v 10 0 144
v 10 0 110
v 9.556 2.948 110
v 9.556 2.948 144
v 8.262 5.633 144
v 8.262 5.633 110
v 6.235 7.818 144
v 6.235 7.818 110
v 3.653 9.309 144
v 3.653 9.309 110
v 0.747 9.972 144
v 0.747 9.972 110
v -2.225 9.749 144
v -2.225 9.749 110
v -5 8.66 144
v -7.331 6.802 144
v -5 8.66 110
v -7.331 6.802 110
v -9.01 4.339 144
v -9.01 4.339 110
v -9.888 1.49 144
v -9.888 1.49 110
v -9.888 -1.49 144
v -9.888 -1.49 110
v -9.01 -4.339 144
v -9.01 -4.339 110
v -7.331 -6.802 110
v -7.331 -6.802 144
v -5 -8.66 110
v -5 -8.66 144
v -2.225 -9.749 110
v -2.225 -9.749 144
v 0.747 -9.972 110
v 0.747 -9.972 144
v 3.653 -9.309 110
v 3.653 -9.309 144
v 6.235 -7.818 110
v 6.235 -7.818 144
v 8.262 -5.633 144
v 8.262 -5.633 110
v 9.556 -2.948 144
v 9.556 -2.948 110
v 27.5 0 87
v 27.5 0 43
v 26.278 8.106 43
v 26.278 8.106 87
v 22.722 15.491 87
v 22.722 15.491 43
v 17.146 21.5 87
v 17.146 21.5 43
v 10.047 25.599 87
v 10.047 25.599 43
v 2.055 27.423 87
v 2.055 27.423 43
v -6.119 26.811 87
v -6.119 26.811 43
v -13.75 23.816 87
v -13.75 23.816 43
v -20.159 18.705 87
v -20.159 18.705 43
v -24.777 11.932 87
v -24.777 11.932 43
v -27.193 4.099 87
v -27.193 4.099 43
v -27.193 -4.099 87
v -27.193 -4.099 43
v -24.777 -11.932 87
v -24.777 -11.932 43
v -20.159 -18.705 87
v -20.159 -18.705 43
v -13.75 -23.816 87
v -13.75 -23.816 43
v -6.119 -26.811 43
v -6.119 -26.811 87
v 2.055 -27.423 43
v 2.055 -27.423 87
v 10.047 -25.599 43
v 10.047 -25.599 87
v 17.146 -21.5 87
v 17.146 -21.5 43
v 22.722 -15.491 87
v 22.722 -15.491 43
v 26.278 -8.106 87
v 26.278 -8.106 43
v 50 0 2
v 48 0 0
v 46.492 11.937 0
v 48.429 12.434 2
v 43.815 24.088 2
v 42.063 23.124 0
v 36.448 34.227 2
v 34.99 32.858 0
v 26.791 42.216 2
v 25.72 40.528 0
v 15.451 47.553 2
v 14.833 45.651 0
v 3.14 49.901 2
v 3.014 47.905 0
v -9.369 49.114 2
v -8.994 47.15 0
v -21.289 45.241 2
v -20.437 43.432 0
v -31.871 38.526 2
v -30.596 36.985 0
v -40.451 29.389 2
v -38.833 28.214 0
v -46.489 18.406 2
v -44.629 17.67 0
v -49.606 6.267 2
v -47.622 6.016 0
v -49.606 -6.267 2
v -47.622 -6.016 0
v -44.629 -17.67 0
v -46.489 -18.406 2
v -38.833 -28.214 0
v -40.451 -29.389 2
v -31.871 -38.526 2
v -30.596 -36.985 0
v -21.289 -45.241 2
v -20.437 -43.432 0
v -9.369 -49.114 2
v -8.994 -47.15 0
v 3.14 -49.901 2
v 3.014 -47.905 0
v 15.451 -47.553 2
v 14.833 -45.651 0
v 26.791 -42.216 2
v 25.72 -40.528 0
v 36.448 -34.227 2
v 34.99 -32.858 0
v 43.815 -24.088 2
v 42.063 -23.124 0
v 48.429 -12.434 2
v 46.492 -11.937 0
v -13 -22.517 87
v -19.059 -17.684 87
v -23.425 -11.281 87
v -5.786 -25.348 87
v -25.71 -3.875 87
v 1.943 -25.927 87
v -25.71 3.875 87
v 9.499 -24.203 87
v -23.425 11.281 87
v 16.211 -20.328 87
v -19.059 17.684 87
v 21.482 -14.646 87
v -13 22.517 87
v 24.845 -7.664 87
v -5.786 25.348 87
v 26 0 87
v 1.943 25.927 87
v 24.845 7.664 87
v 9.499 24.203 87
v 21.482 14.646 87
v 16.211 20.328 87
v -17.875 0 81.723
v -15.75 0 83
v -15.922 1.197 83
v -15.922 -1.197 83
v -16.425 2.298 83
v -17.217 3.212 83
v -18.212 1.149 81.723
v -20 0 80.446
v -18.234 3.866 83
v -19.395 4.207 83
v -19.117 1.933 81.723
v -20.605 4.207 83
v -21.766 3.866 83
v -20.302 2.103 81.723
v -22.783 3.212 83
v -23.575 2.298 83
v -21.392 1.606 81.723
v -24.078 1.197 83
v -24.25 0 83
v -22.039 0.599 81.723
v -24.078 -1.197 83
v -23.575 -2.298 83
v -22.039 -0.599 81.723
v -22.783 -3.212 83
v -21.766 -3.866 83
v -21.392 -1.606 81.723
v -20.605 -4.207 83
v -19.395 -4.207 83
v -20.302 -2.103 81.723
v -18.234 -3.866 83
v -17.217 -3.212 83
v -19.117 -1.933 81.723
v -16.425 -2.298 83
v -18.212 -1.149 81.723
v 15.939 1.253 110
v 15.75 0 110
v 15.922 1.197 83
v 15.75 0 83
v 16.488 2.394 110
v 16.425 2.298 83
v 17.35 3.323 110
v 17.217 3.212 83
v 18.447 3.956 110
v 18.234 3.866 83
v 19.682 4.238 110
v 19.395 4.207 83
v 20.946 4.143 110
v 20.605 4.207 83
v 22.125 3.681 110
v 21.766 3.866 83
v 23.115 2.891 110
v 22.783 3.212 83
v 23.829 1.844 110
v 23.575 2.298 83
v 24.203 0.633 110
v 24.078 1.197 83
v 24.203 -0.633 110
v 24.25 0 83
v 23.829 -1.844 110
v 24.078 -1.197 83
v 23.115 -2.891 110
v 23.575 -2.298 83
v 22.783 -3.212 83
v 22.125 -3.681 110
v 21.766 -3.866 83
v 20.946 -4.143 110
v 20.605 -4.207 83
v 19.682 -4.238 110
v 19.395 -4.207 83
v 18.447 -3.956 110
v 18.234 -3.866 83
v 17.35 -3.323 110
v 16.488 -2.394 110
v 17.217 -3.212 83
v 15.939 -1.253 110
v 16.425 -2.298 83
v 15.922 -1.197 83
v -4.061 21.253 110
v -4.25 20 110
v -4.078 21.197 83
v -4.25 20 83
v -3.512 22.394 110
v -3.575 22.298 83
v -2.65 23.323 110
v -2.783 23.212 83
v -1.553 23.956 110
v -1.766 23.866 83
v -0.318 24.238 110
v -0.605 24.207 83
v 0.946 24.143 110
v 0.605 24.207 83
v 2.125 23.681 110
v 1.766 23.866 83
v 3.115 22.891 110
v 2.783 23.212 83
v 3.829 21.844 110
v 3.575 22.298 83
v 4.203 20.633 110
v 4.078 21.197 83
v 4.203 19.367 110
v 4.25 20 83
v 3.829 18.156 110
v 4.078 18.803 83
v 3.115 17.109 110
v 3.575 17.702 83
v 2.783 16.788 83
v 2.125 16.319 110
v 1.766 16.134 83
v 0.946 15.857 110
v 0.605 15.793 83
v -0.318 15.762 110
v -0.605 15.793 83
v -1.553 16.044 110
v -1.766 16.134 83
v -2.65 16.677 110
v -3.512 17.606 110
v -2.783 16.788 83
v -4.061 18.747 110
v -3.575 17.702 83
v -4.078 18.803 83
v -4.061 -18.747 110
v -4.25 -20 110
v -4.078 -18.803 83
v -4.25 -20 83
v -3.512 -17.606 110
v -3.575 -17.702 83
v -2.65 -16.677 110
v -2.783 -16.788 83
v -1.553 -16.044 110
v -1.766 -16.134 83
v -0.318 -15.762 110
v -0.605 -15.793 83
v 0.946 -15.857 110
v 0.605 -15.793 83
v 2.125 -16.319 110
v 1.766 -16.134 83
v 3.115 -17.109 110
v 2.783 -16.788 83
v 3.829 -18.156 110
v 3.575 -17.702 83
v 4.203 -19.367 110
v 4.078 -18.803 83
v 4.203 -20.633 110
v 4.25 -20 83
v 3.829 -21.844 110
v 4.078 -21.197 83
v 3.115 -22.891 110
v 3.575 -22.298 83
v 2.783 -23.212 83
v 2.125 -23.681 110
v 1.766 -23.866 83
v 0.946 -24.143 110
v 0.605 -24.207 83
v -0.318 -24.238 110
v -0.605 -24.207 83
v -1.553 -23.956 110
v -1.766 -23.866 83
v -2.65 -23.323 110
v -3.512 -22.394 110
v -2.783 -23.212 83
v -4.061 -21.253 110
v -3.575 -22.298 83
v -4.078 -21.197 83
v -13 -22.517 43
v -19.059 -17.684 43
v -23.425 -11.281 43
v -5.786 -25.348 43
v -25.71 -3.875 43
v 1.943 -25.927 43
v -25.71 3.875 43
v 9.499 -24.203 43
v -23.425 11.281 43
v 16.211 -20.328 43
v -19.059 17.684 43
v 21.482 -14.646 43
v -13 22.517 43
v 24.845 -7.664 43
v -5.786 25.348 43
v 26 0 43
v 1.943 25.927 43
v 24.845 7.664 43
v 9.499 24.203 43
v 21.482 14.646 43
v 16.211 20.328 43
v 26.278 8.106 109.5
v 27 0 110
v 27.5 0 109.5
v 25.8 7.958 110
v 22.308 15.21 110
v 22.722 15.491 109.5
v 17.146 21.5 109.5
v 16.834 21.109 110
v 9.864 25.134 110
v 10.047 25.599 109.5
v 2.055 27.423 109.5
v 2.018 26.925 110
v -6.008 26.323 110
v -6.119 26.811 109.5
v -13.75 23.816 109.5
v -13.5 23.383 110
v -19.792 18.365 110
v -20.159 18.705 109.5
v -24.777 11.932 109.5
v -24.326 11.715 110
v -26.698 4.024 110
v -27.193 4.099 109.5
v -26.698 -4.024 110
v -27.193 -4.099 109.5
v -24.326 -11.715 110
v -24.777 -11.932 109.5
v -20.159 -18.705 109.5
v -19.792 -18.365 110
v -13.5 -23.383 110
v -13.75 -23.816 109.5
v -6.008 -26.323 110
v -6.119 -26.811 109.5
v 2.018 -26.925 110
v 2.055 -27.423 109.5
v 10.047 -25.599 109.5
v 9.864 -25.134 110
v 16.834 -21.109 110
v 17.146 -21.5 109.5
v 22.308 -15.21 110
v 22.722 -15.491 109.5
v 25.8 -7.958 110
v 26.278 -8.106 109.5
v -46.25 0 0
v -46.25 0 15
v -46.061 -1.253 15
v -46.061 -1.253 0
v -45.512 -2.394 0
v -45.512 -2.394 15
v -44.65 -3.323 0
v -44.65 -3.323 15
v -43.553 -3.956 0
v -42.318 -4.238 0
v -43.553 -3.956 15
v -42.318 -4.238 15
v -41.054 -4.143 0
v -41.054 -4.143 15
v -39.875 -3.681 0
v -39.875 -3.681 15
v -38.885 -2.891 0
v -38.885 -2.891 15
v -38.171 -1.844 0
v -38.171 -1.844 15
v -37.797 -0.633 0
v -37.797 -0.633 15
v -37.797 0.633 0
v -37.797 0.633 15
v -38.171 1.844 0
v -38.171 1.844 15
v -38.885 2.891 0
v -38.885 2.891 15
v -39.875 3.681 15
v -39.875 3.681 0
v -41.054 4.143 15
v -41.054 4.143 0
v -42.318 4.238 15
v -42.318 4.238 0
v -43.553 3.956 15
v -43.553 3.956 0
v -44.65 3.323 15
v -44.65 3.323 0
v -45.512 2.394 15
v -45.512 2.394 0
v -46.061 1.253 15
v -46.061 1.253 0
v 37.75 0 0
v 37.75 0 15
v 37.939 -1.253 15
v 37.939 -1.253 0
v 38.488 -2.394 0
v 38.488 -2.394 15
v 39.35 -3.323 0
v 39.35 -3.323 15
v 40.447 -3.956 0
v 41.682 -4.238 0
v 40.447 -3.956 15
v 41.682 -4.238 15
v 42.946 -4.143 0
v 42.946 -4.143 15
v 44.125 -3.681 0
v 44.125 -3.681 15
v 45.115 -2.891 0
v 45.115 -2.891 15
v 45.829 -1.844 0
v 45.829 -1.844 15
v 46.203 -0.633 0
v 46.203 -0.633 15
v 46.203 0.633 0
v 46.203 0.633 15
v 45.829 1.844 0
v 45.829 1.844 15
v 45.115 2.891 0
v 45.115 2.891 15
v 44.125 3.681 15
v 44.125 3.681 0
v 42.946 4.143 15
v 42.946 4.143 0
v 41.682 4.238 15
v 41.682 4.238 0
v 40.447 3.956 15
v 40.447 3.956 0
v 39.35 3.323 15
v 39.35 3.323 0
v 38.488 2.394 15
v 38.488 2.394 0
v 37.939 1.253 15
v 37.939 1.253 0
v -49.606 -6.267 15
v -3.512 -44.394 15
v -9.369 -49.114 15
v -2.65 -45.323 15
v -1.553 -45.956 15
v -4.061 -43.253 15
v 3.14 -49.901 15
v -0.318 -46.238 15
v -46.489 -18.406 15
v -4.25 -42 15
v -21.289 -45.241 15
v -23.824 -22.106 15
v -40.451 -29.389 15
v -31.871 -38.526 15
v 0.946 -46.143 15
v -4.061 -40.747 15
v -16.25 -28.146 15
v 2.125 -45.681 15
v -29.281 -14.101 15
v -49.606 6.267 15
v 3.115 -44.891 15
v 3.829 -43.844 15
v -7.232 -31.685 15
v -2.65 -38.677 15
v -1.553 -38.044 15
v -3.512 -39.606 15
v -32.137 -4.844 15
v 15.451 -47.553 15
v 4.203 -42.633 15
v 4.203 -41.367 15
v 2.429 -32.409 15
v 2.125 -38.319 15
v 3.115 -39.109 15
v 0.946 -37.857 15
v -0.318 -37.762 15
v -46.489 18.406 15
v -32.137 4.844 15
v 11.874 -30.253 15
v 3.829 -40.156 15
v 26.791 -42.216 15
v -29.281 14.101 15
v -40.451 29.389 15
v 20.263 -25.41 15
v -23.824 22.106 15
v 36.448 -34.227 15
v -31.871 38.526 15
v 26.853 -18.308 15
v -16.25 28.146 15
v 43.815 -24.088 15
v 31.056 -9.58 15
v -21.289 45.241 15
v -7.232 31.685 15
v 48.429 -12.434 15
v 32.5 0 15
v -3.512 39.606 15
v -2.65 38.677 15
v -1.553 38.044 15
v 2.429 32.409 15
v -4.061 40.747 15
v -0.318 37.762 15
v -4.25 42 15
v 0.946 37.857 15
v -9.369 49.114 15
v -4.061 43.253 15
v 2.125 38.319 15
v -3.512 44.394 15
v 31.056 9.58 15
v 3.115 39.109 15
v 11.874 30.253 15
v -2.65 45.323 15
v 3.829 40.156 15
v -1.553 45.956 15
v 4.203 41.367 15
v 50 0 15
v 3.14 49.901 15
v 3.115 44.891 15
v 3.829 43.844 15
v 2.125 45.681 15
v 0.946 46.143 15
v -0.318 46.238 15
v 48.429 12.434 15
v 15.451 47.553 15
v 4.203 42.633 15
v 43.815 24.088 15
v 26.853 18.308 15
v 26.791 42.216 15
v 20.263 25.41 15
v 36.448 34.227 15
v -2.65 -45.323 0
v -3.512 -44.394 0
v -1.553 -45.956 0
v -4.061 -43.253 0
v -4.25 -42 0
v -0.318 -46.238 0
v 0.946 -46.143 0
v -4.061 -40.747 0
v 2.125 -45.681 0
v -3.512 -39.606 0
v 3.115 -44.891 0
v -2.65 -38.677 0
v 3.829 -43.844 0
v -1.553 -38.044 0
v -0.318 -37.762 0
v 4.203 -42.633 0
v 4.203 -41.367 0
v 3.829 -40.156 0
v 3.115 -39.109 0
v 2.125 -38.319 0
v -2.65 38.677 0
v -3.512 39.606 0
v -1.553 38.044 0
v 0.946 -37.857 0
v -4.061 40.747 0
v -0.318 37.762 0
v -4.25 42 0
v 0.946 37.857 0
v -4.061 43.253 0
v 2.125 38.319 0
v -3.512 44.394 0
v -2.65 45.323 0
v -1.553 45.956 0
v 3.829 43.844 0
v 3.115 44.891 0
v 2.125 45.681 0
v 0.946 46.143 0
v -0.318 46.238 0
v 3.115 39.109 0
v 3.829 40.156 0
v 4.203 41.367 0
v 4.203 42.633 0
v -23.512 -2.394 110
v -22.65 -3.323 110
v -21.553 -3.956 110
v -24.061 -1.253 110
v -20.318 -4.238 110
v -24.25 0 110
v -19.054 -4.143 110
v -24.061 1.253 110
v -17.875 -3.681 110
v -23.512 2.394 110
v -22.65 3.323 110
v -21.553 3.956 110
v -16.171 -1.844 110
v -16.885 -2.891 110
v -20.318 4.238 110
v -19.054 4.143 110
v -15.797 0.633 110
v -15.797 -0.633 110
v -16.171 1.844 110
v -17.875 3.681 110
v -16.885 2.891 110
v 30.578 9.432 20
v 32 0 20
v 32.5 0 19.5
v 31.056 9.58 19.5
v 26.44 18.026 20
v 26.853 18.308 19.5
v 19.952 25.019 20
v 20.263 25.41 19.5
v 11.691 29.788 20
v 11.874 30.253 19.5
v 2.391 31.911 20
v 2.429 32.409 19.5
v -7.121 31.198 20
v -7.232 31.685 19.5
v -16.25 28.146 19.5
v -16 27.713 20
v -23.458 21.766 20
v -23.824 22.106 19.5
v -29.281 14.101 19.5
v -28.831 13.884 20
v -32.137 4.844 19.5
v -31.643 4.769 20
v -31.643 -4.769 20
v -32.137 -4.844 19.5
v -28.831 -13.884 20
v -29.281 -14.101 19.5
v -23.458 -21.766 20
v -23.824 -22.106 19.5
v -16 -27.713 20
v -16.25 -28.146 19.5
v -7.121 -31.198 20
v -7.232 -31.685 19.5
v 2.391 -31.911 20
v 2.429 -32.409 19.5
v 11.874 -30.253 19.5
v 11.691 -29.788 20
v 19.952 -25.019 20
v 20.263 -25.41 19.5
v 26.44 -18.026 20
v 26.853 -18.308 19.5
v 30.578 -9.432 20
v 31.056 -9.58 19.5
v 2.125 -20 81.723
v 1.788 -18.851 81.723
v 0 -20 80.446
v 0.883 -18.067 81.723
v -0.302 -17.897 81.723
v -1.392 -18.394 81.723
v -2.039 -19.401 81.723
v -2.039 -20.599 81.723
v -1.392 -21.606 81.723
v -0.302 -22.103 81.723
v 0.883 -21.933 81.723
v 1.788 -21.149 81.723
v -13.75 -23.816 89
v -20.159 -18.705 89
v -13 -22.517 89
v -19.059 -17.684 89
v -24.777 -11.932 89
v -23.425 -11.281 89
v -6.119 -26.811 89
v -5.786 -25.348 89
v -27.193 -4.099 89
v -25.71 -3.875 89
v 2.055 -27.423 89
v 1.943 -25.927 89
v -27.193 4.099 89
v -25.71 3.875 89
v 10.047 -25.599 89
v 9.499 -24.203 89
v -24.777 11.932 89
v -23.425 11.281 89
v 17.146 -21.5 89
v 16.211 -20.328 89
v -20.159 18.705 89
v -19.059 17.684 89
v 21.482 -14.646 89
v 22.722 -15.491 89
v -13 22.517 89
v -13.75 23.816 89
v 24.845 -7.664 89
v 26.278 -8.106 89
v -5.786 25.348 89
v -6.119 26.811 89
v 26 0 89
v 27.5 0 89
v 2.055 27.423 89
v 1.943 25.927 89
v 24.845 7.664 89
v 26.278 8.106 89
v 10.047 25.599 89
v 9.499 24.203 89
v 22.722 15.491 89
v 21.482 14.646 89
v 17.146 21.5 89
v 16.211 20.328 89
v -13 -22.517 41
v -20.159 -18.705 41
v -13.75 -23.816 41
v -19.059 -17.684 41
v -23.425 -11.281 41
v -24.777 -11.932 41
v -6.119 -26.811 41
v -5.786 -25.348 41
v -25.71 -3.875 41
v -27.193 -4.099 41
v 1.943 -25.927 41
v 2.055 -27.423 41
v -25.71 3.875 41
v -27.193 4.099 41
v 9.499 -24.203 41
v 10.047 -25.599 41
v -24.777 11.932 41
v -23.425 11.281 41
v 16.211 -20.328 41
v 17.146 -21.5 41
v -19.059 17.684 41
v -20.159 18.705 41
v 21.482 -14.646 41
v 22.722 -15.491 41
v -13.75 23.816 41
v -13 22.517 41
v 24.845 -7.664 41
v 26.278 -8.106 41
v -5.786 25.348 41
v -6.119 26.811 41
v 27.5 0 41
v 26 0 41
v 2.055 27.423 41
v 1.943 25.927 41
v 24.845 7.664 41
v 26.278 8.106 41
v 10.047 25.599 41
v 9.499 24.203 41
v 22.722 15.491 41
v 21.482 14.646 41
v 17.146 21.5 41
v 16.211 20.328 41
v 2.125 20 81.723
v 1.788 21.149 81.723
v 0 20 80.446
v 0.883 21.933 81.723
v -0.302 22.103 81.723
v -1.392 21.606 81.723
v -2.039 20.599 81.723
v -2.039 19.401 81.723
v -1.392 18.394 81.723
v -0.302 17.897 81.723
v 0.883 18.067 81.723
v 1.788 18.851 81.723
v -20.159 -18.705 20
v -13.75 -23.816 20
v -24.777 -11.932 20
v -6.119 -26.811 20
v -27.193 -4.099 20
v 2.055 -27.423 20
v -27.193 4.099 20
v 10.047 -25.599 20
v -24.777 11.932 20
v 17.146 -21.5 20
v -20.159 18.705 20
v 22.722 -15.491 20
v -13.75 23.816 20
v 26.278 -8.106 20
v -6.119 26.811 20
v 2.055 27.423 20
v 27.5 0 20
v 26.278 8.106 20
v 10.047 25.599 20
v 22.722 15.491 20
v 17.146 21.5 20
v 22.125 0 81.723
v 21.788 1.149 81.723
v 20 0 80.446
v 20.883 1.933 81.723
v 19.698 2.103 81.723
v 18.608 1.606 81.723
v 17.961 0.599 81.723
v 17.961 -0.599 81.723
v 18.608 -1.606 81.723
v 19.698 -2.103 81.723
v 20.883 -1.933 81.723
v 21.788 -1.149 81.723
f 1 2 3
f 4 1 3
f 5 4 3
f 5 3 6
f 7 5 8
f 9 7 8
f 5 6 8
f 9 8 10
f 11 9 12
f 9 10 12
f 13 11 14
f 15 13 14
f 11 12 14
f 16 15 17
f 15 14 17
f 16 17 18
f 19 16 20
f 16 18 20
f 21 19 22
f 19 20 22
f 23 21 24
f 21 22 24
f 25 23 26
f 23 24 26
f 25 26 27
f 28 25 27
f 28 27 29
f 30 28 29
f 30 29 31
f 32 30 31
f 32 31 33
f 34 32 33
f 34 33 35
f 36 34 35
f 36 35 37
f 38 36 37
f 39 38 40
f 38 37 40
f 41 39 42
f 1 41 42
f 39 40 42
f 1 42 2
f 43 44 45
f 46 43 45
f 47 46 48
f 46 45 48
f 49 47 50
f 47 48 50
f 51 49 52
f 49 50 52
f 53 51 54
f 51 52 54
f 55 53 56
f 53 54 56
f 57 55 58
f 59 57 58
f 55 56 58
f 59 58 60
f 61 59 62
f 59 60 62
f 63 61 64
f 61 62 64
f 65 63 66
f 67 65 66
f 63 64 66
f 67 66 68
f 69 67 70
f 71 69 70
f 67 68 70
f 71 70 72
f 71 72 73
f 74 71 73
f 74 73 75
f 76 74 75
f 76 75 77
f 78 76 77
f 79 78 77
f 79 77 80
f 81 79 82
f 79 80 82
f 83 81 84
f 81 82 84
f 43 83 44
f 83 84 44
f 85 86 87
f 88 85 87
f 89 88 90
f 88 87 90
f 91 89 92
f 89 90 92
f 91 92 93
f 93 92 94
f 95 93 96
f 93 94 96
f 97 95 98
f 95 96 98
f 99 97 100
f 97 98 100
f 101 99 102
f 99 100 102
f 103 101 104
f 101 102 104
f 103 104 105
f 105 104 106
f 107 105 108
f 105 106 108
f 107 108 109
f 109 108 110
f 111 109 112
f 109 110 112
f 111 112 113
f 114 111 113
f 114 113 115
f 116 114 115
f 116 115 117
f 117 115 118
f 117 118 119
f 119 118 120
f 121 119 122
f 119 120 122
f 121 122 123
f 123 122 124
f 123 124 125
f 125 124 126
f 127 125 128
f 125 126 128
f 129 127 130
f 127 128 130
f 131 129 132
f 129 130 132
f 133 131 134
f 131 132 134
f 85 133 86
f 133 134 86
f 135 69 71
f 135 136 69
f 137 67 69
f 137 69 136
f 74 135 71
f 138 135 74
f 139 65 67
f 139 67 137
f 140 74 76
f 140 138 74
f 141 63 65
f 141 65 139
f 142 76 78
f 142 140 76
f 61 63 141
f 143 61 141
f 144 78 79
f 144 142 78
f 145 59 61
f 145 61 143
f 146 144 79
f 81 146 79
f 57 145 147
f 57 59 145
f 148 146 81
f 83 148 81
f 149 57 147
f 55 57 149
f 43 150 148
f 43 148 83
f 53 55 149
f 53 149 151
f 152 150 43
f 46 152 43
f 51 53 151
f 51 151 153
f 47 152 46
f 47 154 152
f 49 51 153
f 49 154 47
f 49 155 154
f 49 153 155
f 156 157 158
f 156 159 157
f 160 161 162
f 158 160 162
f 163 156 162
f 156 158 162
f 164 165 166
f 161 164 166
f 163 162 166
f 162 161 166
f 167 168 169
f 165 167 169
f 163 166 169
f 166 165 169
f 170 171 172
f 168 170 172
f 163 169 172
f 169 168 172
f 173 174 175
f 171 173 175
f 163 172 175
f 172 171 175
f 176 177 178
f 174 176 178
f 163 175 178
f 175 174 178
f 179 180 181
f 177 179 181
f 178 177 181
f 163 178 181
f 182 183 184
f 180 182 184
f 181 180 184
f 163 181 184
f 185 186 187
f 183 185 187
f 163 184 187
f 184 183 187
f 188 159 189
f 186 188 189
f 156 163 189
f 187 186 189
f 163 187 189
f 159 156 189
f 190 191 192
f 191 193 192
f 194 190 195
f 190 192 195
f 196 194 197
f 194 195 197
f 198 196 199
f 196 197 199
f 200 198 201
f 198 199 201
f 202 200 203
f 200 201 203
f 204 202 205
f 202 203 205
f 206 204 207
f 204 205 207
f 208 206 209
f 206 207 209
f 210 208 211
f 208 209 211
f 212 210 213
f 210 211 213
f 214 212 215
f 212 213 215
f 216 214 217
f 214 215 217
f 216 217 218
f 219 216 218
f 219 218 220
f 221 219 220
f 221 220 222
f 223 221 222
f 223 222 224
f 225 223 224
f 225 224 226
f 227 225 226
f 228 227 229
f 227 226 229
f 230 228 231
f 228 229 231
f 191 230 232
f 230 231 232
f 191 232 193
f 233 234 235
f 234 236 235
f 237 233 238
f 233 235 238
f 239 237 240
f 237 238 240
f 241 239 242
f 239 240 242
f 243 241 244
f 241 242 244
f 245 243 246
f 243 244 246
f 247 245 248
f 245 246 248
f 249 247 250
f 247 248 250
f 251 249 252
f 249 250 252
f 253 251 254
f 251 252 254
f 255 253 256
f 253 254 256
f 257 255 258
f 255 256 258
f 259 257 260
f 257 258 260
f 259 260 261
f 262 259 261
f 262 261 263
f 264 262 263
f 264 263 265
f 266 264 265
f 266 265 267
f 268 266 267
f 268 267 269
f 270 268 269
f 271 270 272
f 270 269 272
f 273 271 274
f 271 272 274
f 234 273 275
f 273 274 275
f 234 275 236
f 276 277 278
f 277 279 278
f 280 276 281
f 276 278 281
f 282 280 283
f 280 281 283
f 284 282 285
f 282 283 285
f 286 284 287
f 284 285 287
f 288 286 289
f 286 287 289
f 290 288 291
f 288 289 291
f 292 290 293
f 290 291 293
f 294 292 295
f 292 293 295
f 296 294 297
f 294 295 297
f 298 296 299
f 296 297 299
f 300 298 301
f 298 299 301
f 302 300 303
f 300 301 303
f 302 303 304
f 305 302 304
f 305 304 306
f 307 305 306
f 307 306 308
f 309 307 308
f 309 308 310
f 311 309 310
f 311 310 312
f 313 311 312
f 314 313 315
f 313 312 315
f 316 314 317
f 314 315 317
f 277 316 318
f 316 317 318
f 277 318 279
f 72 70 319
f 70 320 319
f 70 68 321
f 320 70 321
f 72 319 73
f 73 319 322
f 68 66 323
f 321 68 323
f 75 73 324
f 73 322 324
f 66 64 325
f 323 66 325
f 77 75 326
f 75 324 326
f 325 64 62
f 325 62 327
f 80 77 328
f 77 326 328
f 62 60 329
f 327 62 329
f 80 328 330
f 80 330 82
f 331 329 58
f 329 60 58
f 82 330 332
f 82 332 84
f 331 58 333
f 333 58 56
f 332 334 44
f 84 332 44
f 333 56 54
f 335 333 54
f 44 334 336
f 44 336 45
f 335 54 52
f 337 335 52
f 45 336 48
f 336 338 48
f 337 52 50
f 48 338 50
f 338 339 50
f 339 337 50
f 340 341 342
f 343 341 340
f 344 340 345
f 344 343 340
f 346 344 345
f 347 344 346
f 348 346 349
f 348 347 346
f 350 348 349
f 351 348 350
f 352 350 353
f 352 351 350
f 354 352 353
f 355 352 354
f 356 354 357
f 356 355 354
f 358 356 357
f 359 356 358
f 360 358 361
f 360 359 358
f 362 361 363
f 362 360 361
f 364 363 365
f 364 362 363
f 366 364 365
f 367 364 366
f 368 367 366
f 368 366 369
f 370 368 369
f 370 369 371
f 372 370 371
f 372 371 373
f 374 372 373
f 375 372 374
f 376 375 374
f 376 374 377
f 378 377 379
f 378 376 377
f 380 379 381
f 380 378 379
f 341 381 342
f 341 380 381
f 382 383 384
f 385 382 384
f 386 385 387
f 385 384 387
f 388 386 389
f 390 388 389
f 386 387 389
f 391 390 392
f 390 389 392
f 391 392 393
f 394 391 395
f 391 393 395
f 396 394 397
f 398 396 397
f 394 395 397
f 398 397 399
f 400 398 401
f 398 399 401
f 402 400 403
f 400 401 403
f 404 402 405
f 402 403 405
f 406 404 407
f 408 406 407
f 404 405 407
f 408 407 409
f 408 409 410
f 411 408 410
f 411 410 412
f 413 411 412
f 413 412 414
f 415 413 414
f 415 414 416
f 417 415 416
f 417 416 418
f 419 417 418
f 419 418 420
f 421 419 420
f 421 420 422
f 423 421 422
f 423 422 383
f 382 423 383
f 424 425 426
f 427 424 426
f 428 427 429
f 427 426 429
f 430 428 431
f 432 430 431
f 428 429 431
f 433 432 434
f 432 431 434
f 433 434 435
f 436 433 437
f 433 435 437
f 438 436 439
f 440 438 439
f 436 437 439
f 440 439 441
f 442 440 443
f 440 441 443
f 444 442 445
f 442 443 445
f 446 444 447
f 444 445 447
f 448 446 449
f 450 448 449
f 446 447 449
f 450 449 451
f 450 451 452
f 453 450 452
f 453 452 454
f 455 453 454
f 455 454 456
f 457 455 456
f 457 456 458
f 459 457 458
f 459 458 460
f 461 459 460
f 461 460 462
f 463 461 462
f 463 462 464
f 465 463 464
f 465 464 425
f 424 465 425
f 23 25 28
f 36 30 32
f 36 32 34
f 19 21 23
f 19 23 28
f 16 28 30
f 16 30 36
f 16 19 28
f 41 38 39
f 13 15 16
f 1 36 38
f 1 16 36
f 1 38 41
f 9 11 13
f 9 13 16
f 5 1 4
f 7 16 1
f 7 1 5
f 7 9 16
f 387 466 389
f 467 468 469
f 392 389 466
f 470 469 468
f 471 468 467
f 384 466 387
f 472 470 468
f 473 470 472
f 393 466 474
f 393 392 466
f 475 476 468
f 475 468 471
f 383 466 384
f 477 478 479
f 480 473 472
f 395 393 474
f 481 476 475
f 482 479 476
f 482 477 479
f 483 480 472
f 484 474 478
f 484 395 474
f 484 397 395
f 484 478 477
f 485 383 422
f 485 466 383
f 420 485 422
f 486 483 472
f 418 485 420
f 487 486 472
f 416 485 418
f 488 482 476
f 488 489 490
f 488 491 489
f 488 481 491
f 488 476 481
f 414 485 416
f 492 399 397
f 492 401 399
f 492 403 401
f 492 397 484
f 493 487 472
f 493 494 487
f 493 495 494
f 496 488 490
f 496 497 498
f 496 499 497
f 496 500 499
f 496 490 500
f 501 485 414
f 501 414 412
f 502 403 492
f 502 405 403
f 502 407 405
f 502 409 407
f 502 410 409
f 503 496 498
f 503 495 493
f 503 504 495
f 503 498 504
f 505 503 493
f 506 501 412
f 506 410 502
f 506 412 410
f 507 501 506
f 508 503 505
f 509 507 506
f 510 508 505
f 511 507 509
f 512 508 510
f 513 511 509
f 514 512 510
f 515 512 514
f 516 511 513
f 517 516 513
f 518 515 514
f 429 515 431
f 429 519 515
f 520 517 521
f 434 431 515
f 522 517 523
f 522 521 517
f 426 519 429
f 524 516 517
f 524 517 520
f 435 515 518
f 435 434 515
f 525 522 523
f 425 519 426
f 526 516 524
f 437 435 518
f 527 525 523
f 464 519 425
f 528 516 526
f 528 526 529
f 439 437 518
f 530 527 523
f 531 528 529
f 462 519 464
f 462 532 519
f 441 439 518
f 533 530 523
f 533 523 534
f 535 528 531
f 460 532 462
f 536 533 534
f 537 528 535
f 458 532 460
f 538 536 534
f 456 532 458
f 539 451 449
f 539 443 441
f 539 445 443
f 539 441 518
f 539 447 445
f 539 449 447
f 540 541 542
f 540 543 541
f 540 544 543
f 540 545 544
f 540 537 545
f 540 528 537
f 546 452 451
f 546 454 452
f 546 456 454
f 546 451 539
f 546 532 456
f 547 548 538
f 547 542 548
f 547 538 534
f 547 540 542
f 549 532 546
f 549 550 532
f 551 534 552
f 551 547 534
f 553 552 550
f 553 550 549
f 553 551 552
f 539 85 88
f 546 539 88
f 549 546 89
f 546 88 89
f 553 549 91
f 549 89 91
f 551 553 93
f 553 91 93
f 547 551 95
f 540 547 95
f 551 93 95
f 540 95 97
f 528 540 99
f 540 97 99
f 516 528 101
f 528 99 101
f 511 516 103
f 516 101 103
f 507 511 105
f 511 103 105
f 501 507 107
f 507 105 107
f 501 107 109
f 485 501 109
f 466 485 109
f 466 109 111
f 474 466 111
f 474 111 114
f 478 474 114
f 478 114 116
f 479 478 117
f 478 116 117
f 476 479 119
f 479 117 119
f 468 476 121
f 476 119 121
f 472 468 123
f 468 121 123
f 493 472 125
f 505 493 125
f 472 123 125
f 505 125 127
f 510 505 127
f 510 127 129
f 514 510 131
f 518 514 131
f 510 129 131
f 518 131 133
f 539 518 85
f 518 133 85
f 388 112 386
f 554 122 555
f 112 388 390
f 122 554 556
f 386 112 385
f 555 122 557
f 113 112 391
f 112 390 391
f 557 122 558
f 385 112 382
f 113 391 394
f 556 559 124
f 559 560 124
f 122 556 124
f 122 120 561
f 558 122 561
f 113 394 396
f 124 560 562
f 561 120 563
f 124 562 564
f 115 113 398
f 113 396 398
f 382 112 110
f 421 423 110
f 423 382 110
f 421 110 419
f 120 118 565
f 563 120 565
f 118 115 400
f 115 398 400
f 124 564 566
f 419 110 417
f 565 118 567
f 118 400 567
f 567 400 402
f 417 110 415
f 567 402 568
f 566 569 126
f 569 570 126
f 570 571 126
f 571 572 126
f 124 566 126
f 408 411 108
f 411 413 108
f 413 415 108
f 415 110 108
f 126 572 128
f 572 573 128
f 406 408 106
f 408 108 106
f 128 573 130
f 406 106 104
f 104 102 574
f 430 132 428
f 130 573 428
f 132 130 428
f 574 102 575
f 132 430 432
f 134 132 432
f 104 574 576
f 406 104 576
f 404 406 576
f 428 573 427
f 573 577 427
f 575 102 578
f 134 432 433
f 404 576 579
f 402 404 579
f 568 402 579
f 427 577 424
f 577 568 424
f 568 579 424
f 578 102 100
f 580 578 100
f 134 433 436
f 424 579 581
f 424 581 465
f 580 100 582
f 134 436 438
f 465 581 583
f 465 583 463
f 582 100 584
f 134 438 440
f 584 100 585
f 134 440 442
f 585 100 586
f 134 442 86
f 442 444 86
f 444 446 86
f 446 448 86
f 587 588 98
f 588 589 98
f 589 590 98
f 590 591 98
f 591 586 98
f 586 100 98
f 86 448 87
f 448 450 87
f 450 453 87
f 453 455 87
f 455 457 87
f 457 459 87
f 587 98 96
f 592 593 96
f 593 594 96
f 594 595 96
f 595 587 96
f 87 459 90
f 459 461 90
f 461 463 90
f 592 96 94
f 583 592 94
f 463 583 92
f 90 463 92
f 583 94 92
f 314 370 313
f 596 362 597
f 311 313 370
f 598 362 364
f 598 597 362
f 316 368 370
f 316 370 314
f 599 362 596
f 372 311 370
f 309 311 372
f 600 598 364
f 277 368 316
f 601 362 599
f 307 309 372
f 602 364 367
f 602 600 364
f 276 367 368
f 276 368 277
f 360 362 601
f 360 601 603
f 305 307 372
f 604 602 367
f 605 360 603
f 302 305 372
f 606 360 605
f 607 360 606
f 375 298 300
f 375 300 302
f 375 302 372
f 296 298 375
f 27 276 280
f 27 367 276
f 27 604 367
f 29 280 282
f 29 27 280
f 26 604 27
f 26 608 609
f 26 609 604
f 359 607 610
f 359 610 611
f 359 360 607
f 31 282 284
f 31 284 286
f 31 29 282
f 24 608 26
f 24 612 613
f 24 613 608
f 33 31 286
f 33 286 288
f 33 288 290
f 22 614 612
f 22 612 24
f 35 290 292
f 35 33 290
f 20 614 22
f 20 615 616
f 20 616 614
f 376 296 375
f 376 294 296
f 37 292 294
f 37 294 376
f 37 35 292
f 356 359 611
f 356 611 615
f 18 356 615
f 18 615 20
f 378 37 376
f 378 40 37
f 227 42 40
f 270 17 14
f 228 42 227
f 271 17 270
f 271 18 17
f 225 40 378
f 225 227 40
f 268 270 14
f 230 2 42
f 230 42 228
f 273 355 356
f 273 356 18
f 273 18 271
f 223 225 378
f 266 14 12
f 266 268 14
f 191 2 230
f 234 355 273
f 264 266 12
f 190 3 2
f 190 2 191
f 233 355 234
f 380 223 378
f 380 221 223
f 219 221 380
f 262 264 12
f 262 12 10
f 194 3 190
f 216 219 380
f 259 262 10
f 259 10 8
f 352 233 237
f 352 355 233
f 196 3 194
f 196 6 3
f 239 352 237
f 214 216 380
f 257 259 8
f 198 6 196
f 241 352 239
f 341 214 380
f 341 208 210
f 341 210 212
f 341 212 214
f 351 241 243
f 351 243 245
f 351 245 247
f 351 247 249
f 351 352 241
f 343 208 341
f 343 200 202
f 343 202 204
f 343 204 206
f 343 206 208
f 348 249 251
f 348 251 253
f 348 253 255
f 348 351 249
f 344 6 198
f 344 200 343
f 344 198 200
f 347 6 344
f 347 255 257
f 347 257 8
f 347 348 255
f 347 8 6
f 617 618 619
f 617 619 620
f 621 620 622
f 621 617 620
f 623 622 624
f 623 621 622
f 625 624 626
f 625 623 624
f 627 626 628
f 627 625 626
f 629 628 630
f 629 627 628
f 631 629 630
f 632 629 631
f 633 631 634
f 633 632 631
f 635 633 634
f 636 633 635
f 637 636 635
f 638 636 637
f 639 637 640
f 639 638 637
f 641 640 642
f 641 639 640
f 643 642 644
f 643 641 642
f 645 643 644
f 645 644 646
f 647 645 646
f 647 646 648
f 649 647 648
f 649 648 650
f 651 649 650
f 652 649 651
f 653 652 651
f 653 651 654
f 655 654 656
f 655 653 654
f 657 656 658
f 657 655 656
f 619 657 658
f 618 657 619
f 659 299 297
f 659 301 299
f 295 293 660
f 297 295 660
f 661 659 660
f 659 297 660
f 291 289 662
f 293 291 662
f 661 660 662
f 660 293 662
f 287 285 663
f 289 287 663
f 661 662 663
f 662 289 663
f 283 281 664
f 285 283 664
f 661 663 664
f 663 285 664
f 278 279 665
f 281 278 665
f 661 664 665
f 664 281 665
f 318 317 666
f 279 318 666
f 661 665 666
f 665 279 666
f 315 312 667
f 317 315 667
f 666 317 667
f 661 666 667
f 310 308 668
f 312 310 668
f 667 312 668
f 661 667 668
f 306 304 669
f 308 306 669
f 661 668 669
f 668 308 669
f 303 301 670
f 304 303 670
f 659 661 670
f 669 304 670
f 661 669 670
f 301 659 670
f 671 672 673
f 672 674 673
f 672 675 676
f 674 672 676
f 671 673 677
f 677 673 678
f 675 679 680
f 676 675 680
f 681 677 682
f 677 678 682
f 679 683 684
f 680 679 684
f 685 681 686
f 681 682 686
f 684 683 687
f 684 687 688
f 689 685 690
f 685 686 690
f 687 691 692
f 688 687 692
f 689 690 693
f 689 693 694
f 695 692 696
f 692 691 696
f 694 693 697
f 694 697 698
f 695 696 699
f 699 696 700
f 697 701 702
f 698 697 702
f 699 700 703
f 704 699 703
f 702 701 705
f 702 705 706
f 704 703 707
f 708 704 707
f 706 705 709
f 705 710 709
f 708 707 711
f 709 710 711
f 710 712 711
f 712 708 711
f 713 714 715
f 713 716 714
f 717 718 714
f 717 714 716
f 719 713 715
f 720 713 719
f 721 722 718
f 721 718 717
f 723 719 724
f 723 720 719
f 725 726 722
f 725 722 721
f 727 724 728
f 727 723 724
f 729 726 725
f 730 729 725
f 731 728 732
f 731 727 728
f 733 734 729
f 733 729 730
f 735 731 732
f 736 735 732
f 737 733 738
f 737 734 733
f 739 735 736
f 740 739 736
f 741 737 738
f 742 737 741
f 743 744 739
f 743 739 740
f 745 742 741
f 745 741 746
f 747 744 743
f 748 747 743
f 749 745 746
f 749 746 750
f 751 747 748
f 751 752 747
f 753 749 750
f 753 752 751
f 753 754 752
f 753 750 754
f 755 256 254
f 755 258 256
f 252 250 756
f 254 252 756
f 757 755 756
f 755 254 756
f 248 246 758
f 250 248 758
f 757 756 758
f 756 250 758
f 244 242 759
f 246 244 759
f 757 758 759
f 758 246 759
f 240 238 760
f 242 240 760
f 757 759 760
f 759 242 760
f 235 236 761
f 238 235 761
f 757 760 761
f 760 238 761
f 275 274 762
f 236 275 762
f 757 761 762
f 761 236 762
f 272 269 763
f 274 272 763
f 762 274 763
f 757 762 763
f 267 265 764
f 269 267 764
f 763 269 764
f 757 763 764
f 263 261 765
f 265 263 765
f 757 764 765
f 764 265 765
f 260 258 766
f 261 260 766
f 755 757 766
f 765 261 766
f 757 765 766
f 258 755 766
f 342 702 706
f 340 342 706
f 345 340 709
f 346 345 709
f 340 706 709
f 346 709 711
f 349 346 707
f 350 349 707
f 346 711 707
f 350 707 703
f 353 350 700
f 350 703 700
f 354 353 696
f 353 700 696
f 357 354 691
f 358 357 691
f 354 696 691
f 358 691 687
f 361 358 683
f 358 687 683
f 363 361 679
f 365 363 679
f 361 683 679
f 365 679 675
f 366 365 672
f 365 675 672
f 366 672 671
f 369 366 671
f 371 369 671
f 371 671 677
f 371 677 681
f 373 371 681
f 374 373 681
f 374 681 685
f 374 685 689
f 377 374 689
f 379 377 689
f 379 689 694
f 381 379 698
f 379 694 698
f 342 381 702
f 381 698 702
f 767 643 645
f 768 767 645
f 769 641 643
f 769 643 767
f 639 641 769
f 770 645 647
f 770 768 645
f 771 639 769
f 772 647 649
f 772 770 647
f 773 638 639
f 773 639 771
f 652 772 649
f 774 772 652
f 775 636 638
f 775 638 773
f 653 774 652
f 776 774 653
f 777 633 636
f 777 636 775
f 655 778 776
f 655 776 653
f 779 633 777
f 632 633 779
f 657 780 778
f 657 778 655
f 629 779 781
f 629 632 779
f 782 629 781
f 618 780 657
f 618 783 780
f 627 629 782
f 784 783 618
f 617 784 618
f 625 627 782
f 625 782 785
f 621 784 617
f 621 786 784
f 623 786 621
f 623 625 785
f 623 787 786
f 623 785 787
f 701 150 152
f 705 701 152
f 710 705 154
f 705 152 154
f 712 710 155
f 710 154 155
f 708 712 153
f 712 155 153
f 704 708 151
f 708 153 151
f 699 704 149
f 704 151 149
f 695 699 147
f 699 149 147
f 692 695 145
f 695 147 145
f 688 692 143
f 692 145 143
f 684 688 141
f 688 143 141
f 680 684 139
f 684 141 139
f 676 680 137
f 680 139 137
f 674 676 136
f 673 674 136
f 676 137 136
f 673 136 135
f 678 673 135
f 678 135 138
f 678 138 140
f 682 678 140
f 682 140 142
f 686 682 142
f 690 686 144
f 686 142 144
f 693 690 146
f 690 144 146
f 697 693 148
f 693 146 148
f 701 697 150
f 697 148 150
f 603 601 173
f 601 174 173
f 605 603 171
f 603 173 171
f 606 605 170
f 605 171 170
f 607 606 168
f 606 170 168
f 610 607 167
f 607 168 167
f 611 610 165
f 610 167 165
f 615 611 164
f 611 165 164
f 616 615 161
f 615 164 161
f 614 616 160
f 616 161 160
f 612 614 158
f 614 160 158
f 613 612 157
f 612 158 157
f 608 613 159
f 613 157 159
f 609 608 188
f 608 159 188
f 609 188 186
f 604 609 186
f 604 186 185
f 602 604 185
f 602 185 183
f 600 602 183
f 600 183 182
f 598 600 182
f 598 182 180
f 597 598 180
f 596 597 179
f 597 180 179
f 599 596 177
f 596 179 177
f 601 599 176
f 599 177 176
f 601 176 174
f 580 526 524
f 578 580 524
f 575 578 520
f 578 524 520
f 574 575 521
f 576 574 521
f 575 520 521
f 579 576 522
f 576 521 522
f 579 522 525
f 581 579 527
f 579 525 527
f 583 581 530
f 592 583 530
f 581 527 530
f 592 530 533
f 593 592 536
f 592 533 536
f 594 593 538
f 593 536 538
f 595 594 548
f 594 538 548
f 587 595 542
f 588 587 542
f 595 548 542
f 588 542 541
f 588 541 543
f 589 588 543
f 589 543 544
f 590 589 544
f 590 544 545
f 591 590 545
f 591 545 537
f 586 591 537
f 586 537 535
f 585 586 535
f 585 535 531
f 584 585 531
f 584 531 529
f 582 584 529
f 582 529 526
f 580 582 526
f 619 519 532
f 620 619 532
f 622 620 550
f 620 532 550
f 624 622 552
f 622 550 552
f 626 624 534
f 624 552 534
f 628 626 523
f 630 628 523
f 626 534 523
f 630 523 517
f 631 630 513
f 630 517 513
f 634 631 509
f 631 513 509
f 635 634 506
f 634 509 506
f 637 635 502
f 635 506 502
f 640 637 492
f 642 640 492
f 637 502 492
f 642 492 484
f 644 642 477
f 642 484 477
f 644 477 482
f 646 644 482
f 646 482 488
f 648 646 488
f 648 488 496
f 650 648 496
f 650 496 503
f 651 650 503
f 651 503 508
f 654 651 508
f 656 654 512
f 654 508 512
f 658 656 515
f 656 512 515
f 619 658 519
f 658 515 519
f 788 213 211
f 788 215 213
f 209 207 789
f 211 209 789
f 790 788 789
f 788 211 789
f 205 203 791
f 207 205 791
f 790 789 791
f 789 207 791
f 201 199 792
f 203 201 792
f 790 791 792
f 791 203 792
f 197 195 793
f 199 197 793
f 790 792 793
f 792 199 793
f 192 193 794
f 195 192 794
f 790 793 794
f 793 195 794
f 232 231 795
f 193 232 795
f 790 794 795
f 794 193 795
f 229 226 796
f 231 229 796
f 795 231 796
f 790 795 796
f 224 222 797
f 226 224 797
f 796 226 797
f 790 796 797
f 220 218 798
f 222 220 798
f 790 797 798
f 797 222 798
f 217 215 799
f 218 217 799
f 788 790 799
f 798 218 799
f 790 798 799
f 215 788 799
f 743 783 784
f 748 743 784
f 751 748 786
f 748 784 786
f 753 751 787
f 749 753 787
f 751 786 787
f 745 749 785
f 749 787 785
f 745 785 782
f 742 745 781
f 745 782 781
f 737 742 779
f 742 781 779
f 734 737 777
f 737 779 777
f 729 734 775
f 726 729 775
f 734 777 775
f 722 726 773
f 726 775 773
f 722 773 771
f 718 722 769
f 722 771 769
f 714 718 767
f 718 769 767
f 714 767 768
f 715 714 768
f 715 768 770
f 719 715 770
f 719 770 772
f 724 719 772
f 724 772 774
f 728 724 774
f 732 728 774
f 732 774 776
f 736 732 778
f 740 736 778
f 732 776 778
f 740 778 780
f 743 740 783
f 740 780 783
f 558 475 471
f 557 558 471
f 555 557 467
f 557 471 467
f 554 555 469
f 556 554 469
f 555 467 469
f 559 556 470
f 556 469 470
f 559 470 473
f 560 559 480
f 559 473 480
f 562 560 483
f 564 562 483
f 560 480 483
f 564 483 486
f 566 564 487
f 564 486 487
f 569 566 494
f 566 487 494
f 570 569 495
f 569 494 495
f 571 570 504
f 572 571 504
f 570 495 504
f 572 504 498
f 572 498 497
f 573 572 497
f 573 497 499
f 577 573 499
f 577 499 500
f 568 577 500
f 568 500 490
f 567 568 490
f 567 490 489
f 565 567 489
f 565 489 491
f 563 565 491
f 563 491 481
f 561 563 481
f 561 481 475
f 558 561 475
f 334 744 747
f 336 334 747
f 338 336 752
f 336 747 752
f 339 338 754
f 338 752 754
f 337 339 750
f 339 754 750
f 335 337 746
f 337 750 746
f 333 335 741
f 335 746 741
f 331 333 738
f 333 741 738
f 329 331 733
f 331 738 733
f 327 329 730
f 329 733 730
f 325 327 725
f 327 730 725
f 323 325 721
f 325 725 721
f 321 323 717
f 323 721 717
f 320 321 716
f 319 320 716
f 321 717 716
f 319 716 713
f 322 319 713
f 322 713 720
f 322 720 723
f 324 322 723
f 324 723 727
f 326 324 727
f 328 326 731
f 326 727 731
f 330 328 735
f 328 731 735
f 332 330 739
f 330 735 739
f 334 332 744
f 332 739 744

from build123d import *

# Parameters (mm, degrees)
F0_R      = 50
F1_DEPTH  = 15
F2_R      = 32.5
F3_DEPTH  = 5
F4_R      = 27.5
F5_DEPTH  = 21
F6_R      = 26
F7_DEPTH  = 2
F8_R      = 27.5
F9_DEPTH  = 44
F10_R     = 26
F11_DEPTH = 2
F12_R     = 27.5
F13_DEPTH = 21
F14_R     = 10
F15_DEPTH = 34
F17_D     = 8.5
F19_D     = 8.5
F19_DEPTH = 27
F19_TIP   = 2.5536576309
F20_SIZE  = 2
F21_SIZE  = 0.5
F22_SIZE  = 0.5


with BuildPart() as f1:
    # F0 (on Top) → F1 (new body)
    with BuildSketch(Plane.XY):
        Circle(F0_R)
    extrude(amount=F1_DEPTH)

    # F2 (on face) → F3 (join)
    with BuildSketch(Plane.XY.offset(15)):
        Circle(F2_R)
    extrude(amount=F3_DEPTH)

    # F4 (on face) → F5 (join)
    with BuildSketch(Plane.XY.offset(20)):
        Circle(F4_R)
    extrude(amount=F5_DEPTH)

    # F6 (on face) → F7 (join)
    with BuildSketch(Plane.XY.offset(41)):
        Circle(F6_R)
    extrude(amount=F7_DEPTH)

    # F8 (on face) → F9 (join)
    with BuildSketch(Plane.XY.offset(43)):
        Circle(F8_R)
    extrude(amount=F9_DEPTH)

    # F10 (on face) → F11 (join)
    with BuildSketch(Plane.XY.offset(87)):
        Circle(F10_R)
    extrude(amount=F11_DEPTH)

    # F12 (on face) → F13 (join)
    with BuildSketch(Plane.XY.offset(89)):
        Circle(F12_R)
    extrude(amount=F13_DEPTH)

    # F14 (on face) → F15 (join)
    with BuildSketch(Plane.XY.offset(110)):
        Circle(F14_R)
    extrude(amount=F15_DEPTH)

    # F17 (through all)
    with Locations(Plane(origin=(0, 0, 0), x_dir=(1, 0, 0), z_dir=(0, 0, -1))):
        with Locations((0, 42), (42, 0), (0, -42), (-42, 0)):
            Hole(F17_D / 2)

    # F19
    with Locations(Plane.XY.offset(110)):
        with Locations((0, 20), (20, 0), (0, -20), (-20, 0)):
            Hole(F19_D / 2, depth=F19_DEPTH)
            with Locations((0, 0, -(F19_DEPTH + F19_TIP / 2))):  # 118° drill point
                Cone(0, F19_D / 2, F19_TIP, mode=Mode.SUBTRACT)

    # F20
    f20_edges = [f1.edges().sort_by_distance(p)[0] for p in [
        (-50, 0, 0),
    ]]
    chamfer(f20_edges, length=F20_SIZE)

    # F21
    f21_edges = [f1.edges().sort_by_distance(p)[0] for p in [
        (-32.5, 0, 20),
    ]]
    chamfer(f21_edges, length=F21_SIZE)

    # F22
    f22_edges = [f1.edges().sort_by_distance(p)[0] for p in [
        (-27.5, 0, 110),
    ]]
    chamfer(f22_edges, length=F22_SIZE)


solid = f1.part
